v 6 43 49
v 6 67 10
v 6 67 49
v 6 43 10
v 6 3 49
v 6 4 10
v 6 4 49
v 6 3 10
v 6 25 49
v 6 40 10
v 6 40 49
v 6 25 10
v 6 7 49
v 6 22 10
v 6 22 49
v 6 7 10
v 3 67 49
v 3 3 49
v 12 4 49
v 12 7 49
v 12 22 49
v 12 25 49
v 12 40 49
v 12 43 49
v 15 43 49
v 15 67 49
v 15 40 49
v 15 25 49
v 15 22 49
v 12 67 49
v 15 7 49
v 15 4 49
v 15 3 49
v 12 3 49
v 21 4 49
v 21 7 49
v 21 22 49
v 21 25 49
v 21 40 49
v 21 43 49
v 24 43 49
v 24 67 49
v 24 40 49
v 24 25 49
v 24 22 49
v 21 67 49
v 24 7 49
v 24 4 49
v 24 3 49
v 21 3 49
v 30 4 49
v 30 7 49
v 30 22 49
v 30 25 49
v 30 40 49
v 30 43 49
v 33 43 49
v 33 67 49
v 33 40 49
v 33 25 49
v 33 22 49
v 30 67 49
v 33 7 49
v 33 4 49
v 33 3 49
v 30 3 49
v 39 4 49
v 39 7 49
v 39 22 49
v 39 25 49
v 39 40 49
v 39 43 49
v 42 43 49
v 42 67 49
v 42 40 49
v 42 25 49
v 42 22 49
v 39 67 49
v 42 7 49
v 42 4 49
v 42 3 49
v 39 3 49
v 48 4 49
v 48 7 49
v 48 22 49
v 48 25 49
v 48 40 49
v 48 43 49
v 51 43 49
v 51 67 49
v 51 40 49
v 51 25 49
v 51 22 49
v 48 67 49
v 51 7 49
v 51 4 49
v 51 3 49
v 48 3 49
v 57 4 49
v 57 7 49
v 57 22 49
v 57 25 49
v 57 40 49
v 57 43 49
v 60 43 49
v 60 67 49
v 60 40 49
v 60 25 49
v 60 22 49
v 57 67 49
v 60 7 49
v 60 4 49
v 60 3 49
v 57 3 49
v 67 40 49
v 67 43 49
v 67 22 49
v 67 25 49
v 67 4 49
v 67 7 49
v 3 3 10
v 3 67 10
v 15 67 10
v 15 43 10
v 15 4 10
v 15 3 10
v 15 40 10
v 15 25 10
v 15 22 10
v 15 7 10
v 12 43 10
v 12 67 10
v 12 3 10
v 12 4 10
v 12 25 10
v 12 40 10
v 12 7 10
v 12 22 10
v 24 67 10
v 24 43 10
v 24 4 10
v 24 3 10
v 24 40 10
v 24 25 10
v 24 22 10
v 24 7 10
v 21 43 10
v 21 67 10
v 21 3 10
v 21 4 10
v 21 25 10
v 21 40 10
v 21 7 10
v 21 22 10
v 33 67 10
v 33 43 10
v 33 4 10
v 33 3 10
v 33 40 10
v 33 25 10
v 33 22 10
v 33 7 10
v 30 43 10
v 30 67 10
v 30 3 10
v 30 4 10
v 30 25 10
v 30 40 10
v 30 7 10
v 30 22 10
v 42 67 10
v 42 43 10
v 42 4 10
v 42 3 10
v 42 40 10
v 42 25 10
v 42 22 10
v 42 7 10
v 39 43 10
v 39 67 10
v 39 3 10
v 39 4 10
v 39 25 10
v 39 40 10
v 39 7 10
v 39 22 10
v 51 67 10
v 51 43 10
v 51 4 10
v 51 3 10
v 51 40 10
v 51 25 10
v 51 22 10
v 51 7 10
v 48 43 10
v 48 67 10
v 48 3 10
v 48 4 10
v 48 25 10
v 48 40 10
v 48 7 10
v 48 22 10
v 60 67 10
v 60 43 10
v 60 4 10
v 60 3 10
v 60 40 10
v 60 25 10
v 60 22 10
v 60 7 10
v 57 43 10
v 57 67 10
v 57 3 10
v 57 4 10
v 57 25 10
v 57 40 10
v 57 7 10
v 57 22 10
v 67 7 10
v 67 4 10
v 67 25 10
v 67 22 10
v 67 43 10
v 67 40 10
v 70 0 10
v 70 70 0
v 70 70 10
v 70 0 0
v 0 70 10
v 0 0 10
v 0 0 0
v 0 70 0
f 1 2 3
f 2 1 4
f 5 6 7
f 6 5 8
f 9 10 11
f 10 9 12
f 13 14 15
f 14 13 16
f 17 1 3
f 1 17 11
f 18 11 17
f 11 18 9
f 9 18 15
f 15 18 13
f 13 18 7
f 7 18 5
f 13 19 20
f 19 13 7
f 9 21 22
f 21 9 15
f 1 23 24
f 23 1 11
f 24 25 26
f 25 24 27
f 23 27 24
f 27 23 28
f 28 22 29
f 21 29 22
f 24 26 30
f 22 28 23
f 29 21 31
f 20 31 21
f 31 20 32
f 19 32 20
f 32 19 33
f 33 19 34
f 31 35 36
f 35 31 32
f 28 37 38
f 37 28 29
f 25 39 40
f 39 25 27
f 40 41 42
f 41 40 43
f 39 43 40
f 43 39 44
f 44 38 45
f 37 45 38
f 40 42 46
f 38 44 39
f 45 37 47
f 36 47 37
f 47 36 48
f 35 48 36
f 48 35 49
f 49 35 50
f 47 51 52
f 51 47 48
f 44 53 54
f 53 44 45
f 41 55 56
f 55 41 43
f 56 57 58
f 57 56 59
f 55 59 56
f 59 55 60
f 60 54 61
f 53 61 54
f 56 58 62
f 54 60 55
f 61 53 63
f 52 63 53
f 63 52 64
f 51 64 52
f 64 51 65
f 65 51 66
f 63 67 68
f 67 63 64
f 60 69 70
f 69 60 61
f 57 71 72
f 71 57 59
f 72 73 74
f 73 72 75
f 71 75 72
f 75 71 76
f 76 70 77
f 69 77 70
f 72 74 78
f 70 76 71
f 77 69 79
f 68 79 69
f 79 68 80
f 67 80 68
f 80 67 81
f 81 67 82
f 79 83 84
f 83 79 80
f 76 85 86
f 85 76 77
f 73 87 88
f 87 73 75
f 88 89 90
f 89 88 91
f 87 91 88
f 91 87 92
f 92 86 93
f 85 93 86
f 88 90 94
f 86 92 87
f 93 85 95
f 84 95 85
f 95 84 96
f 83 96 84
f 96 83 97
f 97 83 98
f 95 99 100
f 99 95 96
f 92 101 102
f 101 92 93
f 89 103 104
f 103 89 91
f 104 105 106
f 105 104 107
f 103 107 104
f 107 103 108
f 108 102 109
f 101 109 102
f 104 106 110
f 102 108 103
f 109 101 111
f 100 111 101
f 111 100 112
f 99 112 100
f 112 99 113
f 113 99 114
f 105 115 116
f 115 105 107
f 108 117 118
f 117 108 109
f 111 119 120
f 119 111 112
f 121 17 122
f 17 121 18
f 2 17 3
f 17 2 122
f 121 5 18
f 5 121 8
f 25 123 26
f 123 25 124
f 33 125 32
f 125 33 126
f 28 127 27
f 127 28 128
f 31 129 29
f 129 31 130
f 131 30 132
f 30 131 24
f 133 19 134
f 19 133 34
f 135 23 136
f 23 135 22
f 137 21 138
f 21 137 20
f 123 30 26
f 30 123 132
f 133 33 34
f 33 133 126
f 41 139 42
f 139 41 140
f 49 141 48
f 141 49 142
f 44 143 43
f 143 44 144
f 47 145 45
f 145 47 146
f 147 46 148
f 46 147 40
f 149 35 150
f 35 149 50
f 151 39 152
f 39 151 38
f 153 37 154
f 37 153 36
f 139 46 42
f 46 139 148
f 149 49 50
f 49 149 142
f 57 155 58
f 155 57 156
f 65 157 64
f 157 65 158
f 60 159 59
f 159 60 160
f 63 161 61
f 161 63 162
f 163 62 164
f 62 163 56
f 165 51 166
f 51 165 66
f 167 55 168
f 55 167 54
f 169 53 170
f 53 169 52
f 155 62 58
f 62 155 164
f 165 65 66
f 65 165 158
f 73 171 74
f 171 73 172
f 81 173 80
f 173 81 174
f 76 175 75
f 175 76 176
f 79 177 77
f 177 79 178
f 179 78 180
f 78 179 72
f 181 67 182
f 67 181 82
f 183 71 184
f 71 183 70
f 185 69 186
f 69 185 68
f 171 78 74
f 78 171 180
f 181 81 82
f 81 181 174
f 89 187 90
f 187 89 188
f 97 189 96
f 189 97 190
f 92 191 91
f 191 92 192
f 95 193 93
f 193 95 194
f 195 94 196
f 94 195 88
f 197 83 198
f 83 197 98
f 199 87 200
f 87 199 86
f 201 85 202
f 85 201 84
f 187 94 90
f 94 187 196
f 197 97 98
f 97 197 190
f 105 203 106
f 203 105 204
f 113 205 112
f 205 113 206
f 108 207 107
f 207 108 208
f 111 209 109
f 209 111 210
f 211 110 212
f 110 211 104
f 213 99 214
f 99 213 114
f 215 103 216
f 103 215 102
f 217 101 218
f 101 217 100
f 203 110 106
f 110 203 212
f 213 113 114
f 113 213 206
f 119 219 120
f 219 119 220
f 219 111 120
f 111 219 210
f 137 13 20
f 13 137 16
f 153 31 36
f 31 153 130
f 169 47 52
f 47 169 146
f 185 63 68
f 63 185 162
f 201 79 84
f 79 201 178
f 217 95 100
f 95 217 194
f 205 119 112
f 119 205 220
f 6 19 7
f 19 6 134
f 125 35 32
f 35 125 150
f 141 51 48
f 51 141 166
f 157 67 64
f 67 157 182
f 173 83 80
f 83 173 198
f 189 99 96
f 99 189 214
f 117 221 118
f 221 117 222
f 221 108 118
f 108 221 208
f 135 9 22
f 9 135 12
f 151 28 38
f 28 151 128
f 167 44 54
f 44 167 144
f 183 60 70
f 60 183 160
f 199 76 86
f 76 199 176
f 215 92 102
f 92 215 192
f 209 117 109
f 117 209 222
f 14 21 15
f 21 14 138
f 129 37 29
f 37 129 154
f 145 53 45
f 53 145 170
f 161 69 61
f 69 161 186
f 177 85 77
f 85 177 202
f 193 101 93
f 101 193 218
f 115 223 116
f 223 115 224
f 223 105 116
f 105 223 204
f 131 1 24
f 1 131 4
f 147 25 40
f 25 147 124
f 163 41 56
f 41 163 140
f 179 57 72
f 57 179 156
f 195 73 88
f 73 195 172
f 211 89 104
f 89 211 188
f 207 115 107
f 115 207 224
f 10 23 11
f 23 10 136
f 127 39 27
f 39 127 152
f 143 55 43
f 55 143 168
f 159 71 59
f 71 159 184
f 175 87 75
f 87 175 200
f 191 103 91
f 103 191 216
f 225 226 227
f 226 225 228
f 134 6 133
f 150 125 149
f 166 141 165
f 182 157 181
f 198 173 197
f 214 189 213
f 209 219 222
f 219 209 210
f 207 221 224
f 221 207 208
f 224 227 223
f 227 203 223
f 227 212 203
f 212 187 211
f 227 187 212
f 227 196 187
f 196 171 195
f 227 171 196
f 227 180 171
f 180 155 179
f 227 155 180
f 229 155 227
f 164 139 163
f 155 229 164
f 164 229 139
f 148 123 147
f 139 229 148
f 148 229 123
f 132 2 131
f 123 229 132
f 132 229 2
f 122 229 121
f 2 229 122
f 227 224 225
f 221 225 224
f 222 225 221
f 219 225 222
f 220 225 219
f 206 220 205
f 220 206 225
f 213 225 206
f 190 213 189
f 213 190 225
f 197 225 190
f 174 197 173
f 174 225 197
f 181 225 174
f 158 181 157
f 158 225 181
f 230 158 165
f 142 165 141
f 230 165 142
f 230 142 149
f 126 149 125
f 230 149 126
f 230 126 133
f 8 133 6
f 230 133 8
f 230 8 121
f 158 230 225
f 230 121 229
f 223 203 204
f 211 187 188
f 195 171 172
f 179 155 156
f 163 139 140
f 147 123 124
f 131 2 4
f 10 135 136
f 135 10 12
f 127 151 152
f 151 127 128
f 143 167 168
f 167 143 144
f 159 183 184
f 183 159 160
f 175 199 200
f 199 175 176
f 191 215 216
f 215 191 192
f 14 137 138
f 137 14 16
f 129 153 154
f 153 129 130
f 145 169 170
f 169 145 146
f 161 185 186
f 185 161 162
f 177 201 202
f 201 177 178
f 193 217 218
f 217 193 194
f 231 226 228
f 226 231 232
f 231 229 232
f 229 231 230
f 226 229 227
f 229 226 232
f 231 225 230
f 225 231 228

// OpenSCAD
$fn = 32;

// ----------------------------------------------------------------------
// Heatsink: cross fin block
// ----------------------------------------------------------------------

// --- parameters (mm) ---
base_l = 70;              // base length, X
base_w = 70;              // base width, Y
base_t = 10;              // base plate thickness
fin_h = 40;               // fin height above the base
fin_t = 3;                // fin thickness
edge = 3;                 // margin from the base ends
pitch = 9;                // fin pitch
rib_pitch = 18;           // cross rib pitch
fit_tol = 0.1;            // tolerance for press fits, mm
free_tol = 0.5;           // tolerance for clearance fits, mm

n_fins = floor((base_l - 2 * edge - fin_t) / pitch) + 1;  // fin count
total_h = base_t + fin_h - 1;  // overall height
n_ribs = floor((base_w - 2 * edge) / rib_pitch);  // rib count

union() {
  cube([base_l, base_w, base_t]);
  for (i = [0 : n_fins - 1])
    translate([edge + i * pitch, edge, base_t - 1])
      cube([fin_t, base_w - 2 * edge, fin_h]);
  for (i = [0 : n_ribs - 1])
    translate([edge, edge + 1 + i * rib_pitch, base_t - 1])
      cube([base_l - 2 * edge, fin_t, fin_h]);
}
